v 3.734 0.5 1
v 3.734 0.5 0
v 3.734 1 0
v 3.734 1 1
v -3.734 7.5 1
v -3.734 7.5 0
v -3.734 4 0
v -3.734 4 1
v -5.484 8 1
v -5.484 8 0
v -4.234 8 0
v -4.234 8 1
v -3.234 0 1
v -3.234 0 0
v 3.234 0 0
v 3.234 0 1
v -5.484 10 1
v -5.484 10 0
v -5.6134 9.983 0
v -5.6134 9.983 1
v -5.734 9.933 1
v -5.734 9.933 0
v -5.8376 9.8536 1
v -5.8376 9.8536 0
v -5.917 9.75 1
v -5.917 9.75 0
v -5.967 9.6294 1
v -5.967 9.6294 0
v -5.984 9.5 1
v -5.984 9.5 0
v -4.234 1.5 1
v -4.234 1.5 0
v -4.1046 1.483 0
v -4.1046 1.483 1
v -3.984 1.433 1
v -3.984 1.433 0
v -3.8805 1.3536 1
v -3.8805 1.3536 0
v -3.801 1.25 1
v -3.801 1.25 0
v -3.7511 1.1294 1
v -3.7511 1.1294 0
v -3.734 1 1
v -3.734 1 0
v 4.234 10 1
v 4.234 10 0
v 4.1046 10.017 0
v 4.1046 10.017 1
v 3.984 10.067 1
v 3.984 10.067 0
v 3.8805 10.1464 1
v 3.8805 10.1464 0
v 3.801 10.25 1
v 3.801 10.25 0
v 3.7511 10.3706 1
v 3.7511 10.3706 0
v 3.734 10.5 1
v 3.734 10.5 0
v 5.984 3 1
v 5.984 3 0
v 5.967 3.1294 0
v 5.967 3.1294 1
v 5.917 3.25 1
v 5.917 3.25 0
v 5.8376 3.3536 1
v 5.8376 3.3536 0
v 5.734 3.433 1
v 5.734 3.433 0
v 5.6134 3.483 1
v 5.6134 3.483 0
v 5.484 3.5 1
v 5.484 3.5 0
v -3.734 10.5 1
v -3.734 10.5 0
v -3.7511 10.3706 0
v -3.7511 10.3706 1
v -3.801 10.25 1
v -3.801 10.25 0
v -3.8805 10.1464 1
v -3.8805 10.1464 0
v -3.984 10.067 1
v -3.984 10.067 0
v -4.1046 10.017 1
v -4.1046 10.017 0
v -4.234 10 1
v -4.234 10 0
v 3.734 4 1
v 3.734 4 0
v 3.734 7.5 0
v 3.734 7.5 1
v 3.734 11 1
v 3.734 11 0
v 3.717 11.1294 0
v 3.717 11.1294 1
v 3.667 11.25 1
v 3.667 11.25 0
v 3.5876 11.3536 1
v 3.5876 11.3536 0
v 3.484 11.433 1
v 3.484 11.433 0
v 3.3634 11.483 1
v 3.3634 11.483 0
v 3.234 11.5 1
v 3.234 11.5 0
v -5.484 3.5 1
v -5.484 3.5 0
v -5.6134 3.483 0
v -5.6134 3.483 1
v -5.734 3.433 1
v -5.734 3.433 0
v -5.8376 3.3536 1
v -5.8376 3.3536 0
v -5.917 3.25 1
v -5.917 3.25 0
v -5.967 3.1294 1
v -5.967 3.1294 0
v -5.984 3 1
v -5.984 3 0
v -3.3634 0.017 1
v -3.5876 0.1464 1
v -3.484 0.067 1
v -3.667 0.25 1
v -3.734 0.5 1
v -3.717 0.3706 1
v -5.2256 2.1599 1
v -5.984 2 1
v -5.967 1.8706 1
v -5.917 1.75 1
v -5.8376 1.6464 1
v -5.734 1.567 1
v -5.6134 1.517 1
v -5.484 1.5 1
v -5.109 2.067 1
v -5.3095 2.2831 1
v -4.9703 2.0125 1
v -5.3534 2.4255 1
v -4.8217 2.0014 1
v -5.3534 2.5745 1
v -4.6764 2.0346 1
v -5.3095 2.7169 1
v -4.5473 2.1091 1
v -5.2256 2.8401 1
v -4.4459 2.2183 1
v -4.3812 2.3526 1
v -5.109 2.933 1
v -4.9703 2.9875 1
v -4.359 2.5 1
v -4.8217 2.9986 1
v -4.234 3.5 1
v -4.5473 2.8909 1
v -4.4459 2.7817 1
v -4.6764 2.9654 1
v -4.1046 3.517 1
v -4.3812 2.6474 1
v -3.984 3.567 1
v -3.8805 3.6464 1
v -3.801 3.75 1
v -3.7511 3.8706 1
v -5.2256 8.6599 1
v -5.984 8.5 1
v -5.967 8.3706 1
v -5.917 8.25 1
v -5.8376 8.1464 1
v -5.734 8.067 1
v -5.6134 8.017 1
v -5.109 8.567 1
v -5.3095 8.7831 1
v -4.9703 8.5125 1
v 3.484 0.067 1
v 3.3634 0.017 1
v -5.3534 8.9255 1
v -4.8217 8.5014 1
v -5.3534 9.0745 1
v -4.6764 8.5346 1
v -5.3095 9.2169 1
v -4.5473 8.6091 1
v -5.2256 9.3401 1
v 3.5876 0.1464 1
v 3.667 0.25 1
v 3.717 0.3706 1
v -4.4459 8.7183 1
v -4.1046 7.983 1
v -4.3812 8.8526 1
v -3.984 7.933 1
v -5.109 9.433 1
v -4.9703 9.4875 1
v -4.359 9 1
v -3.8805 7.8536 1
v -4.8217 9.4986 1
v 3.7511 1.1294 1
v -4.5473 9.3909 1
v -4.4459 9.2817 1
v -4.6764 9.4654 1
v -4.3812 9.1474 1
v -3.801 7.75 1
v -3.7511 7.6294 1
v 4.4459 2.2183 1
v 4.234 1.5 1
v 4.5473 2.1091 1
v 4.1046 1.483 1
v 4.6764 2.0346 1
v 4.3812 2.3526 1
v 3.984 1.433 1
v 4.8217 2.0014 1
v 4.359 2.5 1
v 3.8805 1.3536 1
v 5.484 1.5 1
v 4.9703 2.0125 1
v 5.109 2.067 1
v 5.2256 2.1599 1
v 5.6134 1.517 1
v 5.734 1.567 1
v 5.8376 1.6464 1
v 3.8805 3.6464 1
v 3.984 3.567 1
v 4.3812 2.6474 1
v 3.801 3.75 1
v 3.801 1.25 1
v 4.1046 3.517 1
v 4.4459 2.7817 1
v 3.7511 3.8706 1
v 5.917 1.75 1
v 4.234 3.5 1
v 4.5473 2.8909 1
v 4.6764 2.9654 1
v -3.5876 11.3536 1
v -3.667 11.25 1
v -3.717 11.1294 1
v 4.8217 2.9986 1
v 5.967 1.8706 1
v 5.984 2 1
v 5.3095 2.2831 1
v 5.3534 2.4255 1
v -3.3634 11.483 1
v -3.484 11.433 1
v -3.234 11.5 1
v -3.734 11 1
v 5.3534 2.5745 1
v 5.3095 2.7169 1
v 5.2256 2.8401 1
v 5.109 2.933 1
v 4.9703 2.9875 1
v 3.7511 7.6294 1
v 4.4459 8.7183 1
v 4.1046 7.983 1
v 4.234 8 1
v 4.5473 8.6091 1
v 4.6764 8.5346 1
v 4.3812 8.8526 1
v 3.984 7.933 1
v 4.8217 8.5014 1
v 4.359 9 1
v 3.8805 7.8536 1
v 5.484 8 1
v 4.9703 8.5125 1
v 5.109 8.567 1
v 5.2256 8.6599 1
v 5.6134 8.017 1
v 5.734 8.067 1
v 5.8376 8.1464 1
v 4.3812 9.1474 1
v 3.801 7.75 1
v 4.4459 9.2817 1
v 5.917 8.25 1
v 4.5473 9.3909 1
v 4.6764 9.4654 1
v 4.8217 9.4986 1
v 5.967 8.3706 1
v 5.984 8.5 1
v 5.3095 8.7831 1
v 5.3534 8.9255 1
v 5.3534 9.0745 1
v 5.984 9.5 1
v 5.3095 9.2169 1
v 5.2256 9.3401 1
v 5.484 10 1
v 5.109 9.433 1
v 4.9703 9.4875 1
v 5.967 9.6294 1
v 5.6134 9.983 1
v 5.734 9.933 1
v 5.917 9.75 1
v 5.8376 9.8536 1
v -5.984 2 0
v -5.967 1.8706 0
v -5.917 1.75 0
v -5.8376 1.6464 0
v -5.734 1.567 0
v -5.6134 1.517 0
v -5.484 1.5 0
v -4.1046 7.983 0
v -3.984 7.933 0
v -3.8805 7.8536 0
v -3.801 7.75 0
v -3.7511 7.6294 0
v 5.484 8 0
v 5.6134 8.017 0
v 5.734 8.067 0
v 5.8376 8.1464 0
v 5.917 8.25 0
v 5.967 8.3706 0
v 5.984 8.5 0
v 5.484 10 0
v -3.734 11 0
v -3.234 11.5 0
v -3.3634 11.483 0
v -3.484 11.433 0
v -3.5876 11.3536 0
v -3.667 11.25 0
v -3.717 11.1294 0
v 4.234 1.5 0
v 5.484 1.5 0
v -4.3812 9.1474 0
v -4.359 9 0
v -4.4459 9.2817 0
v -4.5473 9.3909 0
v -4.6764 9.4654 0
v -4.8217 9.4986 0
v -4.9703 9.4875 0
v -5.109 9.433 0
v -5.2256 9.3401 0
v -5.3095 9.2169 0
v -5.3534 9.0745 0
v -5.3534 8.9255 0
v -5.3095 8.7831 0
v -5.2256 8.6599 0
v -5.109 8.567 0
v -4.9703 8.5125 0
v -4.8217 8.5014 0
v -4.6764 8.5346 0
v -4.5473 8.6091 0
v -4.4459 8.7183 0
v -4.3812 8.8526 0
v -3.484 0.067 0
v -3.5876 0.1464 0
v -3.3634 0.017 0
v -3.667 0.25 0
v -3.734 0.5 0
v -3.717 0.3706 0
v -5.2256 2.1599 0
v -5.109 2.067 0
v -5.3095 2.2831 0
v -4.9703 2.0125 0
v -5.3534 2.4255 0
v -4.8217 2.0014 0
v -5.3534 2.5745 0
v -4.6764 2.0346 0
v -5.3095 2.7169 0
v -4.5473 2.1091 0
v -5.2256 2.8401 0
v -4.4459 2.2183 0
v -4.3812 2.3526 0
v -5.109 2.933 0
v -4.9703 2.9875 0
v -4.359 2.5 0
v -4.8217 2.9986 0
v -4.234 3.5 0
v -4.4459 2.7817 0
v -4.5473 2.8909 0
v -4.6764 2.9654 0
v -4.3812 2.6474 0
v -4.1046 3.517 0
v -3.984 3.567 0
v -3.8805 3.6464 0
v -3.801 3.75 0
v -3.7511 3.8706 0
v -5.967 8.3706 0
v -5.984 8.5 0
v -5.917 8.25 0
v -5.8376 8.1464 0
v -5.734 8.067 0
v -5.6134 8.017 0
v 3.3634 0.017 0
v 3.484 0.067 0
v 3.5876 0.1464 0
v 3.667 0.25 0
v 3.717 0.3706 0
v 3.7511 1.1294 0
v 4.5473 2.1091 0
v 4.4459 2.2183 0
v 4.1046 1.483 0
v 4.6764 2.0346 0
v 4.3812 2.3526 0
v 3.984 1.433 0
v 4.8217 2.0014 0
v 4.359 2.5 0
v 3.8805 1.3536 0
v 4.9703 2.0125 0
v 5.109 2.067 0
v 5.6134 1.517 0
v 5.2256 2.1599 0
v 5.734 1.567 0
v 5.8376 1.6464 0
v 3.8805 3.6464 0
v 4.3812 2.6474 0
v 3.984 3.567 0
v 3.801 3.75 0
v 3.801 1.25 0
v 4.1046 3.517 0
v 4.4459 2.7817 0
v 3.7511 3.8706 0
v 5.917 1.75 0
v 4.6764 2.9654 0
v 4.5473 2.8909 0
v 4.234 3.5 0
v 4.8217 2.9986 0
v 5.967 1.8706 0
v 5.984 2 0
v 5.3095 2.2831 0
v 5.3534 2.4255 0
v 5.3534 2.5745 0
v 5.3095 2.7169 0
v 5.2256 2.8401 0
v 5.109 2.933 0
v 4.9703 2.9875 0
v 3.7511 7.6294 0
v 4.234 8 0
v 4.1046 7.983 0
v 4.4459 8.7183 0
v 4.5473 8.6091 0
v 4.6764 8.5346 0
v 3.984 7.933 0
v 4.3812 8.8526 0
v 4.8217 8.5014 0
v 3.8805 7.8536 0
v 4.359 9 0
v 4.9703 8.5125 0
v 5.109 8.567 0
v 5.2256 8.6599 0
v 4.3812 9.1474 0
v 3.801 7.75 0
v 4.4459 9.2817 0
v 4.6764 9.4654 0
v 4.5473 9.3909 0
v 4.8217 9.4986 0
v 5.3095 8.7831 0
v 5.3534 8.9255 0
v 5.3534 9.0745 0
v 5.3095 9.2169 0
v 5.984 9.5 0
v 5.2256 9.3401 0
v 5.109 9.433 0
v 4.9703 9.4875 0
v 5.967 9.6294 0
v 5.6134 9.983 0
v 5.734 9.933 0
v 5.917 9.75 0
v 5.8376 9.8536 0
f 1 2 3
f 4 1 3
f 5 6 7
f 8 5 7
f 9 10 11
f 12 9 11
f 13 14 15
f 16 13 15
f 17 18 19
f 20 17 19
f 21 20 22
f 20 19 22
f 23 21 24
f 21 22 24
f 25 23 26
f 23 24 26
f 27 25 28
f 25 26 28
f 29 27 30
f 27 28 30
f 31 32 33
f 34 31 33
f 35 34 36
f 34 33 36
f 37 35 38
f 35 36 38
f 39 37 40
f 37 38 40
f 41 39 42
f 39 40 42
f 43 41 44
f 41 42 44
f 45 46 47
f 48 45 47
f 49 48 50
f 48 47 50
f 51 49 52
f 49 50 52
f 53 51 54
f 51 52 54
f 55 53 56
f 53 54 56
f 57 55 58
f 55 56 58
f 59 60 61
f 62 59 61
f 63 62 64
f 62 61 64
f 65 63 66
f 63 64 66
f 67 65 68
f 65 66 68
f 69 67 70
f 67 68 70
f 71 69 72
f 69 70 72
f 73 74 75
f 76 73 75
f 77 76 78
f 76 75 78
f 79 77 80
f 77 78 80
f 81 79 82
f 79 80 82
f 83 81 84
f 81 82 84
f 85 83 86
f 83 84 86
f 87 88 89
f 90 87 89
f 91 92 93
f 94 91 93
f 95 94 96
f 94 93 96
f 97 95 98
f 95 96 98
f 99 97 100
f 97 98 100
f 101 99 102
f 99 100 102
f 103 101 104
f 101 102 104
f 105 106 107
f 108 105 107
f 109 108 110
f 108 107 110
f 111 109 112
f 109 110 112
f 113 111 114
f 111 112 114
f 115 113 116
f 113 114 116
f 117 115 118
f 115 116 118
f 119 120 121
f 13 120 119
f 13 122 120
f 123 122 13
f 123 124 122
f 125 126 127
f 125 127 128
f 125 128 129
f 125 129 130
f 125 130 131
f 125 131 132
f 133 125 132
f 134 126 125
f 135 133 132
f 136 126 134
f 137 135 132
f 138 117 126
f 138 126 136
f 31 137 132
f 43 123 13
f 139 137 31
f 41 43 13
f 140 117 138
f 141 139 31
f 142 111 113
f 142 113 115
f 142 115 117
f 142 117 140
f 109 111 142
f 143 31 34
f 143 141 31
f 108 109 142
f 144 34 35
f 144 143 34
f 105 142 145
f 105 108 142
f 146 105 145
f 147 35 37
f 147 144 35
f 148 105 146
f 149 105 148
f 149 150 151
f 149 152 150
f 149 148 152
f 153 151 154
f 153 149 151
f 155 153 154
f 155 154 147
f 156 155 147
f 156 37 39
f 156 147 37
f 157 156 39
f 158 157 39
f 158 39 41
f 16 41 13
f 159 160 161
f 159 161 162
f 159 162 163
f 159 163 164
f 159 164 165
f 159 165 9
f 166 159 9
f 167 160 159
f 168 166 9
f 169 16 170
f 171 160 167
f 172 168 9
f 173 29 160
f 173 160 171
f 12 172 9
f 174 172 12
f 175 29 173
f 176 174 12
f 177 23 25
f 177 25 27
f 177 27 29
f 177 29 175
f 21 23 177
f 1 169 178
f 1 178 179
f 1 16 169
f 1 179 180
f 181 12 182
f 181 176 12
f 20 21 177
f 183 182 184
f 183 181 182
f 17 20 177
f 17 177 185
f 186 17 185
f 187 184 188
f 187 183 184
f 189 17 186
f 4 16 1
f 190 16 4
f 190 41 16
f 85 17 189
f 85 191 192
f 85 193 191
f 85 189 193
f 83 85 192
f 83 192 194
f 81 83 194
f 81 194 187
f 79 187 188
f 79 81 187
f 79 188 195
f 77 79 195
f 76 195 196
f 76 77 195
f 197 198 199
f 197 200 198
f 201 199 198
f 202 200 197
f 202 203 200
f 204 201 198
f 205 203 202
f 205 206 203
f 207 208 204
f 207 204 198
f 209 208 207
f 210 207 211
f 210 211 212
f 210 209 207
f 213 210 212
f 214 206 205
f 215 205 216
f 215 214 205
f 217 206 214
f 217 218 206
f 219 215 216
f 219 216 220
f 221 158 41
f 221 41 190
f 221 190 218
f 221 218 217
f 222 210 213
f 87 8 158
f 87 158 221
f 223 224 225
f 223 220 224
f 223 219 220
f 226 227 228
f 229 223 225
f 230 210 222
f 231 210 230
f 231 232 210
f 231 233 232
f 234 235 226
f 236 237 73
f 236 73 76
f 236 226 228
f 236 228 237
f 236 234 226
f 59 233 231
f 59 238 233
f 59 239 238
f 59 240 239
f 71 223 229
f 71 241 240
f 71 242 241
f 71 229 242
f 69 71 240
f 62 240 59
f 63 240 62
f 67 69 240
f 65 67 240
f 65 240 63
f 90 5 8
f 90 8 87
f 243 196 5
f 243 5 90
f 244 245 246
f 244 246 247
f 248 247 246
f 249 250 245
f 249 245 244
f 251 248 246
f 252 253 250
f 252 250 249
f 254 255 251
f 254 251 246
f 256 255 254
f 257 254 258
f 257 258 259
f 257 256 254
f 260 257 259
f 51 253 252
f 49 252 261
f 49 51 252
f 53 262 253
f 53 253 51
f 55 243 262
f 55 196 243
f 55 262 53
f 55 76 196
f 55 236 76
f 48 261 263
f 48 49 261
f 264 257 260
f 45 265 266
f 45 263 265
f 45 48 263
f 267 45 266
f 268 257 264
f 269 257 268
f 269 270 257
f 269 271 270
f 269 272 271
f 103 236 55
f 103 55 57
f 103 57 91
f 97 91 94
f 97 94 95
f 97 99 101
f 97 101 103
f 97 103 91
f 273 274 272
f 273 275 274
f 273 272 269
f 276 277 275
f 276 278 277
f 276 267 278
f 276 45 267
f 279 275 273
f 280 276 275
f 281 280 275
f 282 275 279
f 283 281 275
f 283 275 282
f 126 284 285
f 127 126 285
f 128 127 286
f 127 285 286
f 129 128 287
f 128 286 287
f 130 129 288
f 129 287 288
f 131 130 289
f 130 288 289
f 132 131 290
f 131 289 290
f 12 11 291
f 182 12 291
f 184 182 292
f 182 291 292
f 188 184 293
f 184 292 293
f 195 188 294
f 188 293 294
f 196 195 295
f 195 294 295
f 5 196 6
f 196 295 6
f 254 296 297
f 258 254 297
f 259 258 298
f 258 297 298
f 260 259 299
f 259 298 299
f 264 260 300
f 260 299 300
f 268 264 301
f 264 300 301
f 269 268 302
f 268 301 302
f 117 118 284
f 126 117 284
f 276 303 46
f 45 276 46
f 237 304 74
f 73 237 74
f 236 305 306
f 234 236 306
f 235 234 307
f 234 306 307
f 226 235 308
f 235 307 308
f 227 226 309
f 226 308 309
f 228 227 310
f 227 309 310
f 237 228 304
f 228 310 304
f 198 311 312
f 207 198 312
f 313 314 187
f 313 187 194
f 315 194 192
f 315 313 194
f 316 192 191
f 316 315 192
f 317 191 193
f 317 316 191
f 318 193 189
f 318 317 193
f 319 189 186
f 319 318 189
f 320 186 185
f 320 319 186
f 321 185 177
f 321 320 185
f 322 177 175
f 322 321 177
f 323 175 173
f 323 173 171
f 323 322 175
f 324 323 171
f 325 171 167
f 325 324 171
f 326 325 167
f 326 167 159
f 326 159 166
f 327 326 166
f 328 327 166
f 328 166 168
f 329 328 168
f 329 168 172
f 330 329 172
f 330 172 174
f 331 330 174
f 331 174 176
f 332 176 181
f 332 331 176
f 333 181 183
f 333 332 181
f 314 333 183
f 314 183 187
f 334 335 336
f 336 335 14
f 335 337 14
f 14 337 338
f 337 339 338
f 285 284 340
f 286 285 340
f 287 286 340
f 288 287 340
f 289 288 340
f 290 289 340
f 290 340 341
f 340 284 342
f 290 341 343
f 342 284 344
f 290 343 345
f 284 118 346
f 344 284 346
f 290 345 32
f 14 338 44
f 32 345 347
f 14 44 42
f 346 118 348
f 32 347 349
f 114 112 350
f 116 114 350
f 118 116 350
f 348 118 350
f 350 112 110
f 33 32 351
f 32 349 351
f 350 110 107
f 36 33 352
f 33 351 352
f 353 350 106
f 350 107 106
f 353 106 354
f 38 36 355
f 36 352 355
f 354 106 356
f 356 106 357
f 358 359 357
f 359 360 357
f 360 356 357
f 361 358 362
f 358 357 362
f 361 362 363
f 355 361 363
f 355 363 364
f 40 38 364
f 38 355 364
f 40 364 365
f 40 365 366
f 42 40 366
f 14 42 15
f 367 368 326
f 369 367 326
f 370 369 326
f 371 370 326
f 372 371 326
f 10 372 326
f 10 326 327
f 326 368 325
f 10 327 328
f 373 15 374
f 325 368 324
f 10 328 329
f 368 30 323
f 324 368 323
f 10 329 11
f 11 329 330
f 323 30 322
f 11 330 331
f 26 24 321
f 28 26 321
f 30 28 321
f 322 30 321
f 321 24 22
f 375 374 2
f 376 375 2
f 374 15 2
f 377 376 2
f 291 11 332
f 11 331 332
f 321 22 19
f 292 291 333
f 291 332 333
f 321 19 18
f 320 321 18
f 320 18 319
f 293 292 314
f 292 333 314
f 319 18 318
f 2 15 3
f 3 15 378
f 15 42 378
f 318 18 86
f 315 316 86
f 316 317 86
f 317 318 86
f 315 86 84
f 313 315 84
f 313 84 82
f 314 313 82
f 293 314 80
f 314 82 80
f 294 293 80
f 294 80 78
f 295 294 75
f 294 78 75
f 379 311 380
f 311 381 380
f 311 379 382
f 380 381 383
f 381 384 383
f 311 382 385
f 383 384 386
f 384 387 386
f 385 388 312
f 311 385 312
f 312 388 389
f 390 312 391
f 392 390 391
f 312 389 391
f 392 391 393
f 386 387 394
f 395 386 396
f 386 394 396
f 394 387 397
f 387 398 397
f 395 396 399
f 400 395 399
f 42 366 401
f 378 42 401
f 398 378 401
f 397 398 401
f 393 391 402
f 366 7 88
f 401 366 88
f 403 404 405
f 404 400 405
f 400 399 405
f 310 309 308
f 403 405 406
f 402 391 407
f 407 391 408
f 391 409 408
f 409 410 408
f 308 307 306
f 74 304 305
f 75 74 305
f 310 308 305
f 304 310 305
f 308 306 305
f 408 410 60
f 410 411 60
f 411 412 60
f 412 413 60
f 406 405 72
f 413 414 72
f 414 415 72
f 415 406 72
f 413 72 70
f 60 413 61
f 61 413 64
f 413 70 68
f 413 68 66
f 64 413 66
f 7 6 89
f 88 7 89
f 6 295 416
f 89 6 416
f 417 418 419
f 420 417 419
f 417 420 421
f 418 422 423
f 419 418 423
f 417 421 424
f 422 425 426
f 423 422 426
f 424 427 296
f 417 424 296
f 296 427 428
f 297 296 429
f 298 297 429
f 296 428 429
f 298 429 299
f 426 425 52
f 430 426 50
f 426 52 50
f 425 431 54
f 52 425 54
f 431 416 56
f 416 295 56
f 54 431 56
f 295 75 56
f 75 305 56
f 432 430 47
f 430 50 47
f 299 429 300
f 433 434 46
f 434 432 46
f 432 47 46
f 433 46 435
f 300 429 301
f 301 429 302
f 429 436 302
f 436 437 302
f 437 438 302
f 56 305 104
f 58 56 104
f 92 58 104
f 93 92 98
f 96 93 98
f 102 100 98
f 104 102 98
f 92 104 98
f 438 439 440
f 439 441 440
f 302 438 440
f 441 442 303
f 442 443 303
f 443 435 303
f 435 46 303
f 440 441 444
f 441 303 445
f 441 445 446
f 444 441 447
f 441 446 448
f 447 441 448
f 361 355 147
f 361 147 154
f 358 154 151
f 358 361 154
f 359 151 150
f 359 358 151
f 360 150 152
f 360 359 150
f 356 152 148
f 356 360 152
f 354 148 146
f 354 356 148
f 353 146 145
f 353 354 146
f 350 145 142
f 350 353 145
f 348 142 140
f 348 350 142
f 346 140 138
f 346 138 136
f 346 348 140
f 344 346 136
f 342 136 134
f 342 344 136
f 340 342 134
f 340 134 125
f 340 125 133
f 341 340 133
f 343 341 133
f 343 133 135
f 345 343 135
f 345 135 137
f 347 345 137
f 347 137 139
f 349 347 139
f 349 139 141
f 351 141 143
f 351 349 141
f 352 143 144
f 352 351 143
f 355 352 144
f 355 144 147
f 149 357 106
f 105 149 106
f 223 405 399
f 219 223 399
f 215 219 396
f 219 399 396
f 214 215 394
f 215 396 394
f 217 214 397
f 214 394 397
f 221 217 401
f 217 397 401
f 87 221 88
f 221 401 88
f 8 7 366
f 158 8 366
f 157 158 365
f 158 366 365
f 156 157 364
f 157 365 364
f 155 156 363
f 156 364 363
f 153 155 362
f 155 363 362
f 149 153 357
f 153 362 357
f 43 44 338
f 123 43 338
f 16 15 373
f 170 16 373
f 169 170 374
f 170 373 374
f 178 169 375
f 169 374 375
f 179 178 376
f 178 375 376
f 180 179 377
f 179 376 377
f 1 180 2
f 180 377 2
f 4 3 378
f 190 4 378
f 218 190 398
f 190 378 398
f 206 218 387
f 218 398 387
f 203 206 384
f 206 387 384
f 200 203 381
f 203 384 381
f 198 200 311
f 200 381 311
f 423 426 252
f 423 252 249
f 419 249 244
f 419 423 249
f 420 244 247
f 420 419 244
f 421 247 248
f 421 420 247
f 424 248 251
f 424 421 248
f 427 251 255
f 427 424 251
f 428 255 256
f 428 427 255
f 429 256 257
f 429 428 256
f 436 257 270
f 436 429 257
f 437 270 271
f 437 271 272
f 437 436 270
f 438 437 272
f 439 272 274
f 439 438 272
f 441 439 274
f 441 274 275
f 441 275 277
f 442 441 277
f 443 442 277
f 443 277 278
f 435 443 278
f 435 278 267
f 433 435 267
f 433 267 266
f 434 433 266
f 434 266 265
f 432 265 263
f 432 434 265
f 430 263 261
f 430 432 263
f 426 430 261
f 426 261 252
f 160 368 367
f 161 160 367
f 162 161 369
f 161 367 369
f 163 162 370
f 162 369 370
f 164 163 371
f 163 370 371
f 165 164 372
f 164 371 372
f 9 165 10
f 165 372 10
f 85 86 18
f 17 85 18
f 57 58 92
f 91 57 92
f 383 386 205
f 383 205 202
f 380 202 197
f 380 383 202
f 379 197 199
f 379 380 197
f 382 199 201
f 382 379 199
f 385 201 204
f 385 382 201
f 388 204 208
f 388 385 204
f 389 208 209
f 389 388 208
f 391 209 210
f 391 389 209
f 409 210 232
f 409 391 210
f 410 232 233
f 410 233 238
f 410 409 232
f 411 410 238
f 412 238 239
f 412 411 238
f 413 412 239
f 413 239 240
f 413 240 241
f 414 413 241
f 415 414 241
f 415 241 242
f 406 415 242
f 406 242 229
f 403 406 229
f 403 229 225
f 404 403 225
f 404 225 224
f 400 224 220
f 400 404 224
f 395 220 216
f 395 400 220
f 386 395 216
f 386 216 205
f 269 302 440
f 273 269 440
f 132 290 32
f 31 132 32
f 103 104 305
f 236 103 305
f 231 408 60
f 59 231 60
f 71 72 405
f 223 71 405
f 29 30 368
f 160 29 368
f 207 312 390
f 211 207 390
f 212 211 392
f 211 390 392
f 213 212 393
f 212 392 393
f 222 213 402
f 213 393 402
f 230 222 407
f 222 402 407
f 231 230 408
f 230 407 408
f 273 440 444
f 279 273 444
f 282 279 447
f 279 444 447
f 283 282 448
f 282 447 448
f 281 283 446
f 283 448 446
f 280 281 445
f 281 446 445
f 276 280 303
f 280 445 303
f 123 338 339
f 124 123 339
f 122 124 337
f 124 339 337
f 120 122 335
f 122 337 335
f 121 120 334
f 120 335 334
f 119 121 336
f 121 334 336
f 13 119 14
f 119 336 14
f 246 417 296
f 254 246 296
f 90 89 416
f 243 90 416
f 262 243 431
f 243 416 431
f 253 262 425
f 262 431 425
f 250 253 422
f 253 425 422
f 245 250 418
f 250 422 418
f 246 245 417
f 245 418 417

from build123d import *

# Parameters (mm, degrees)
SKETCH1_R           = 0.5
BOSS_EXTRUDE1_DEPTH = 1


with BuildPart() as part:
    # Sketch1 → Boss-Extrude1 (new body)
    with BuildSketch(Plane.XY):
        with BuildLine():
            Line((-3.734024834, 11), (-3.734024834, 10.5))
            ThreePointArc((-3.734024834, 10.5), (-3.880471443, 10.146446609), (-4.234024834, 10))
            Line((-4.234024834, 10), (-5.484024834, 10))
            ThreePointArc((-5.484024834, 10), (-5.837578224, 9.853553391), (-5.984024834, 9.5))
            Line((-5.984024834, 9.5), (-5.984024834, 8.5))
            ThreePointArc((-5.984024834, 8.5), (-5.837578224, 8.146446609), (-5.484024834, 8))
            Line((-5.484024834, 8), (-4.234024834, 8))
            ThreePointArc((-4.234024834, 8), (-3.880471443, 7.853553391), (-3.734024834, 7.5))
            Line((-3.734024834, 7.5), (-3.734024834, 4))
            ThreePointArc((-3.734024834, 4), (-3.880471443, 3.646446609), (-4.234024834, 3.5))
            Line((-4.234024834, 3.5), (-5.484024834, 3.5))
            ThreePointArc((-5.484024834, 3.5), (-5.837578224, 3.353553391), (-5.984024834, 3))
            Line((-5.984024834, 3), (-5.984024834, 2))
            ThreePointArc((-5.984024834, 2), (-5.837578224, 1.646446609), (-5.484024834, 1.5))
            Line((-5.484024834, 1.5), (-4.234024834, 1.5))
            ThreePointArc((-4.234024834, 1.5), (-3.880471443, 1.353553391), (-3.734024834, 1))
            Line((-3.734024834, 1), (-3.734024834, 0.5))
            ThreePointArc((-3.734024834, 0.5), (-3.587578224, 0.146446609), (-3.234024834, 0))
            Line((-3.234024834, 0), (3.234024834, 0))
            ThreePointArc((3.234024834, 0), (3.587578224, 0.146446609), (3.734024834, 0.5))
            Line((3.734024834, 0.5), (3.734024834, 1))
            ThreePointArc((3.734024834, 1), (3.880471443, 1.353553391), (4.234024834, 1.5))
            Line((4.234024834, 1.5), (5.484024834, 1.5))
            ThreePointArc((5.484024834, 1.5), (5.837578224, 1.646446609), (5.984024834, 2))
            Line((5.984024834, 2), (5.984024834, 3))
            ThreePointArc((5.984024834, 3), (5.837578224, 3.353553391), (5.484024834, 3.5))
            Line((5.484024834, 3.5), (4.234024834, 3.5))
            ThreePointArc((4.234024834, 3.5), (3.880471443, 3.646446609), (3.734024834, 4))
            Line((3.734024834, 4), (3.734024834, 7.5))
            ThreePointArc((3.734024834, 7.5), (3.880471443, 7.853553391), (4.234024834, 8))
            Line((4.234024834, 8), (5.484024834, 8))
            ThreePointArc((5.484024834, 8), (5.837578224, 8.146446609), (5.984024834, 8.5))
            Line((5.984024834, 8.5), (5.984024834, 9.5))
            ThreePointArc((5.984024834, 9.5), (5.837578224, 9.853553391), (5.484024834, 10))
            Line((5.484024834, 10), (4.234024834, 10))
            ThreePointArc((4.234024834, 10), (3.880471443, 10.146446609), (3.734024834, 10.5))
            Line((3.734024834, 10.5), (3.734024834, 11))
            ThreePointArc((3.734024834, 11), (3.587578224, 11.353553391), (3.234024834, 11.5))
            Line((3.234024834, 11.5), (-3.234024834, 11.5))
            ThreePointArc((-3.234024834, 11.5), (-3.587578224, 11.353553391), (-3.734024834, 11))
        make_face()
        with Locations((-4.859024834, 9)):
            Circle(SKETCH1_R, mode=Mode.SUBTRACT)
        with Locations((-4.859024834, 2.5)):
            Circle(SKETCH1_R, mode=Mode.SUBTRACT)
        with Locations(Location((4.859024834, 2.5, 0), (0, 0, 180))):
            Circle(SKETCH1_R, mode=Mode.SUBTRACT)
        with Locations(Location((4.859024834, 9, 0), (0, 0, 180))):
            Circle(SKETCH1_R, mode=Mode.SUBTRACT)
    extrude(amount=BOSS_EXTRUDE1_DEPTH)


solid = part.part
